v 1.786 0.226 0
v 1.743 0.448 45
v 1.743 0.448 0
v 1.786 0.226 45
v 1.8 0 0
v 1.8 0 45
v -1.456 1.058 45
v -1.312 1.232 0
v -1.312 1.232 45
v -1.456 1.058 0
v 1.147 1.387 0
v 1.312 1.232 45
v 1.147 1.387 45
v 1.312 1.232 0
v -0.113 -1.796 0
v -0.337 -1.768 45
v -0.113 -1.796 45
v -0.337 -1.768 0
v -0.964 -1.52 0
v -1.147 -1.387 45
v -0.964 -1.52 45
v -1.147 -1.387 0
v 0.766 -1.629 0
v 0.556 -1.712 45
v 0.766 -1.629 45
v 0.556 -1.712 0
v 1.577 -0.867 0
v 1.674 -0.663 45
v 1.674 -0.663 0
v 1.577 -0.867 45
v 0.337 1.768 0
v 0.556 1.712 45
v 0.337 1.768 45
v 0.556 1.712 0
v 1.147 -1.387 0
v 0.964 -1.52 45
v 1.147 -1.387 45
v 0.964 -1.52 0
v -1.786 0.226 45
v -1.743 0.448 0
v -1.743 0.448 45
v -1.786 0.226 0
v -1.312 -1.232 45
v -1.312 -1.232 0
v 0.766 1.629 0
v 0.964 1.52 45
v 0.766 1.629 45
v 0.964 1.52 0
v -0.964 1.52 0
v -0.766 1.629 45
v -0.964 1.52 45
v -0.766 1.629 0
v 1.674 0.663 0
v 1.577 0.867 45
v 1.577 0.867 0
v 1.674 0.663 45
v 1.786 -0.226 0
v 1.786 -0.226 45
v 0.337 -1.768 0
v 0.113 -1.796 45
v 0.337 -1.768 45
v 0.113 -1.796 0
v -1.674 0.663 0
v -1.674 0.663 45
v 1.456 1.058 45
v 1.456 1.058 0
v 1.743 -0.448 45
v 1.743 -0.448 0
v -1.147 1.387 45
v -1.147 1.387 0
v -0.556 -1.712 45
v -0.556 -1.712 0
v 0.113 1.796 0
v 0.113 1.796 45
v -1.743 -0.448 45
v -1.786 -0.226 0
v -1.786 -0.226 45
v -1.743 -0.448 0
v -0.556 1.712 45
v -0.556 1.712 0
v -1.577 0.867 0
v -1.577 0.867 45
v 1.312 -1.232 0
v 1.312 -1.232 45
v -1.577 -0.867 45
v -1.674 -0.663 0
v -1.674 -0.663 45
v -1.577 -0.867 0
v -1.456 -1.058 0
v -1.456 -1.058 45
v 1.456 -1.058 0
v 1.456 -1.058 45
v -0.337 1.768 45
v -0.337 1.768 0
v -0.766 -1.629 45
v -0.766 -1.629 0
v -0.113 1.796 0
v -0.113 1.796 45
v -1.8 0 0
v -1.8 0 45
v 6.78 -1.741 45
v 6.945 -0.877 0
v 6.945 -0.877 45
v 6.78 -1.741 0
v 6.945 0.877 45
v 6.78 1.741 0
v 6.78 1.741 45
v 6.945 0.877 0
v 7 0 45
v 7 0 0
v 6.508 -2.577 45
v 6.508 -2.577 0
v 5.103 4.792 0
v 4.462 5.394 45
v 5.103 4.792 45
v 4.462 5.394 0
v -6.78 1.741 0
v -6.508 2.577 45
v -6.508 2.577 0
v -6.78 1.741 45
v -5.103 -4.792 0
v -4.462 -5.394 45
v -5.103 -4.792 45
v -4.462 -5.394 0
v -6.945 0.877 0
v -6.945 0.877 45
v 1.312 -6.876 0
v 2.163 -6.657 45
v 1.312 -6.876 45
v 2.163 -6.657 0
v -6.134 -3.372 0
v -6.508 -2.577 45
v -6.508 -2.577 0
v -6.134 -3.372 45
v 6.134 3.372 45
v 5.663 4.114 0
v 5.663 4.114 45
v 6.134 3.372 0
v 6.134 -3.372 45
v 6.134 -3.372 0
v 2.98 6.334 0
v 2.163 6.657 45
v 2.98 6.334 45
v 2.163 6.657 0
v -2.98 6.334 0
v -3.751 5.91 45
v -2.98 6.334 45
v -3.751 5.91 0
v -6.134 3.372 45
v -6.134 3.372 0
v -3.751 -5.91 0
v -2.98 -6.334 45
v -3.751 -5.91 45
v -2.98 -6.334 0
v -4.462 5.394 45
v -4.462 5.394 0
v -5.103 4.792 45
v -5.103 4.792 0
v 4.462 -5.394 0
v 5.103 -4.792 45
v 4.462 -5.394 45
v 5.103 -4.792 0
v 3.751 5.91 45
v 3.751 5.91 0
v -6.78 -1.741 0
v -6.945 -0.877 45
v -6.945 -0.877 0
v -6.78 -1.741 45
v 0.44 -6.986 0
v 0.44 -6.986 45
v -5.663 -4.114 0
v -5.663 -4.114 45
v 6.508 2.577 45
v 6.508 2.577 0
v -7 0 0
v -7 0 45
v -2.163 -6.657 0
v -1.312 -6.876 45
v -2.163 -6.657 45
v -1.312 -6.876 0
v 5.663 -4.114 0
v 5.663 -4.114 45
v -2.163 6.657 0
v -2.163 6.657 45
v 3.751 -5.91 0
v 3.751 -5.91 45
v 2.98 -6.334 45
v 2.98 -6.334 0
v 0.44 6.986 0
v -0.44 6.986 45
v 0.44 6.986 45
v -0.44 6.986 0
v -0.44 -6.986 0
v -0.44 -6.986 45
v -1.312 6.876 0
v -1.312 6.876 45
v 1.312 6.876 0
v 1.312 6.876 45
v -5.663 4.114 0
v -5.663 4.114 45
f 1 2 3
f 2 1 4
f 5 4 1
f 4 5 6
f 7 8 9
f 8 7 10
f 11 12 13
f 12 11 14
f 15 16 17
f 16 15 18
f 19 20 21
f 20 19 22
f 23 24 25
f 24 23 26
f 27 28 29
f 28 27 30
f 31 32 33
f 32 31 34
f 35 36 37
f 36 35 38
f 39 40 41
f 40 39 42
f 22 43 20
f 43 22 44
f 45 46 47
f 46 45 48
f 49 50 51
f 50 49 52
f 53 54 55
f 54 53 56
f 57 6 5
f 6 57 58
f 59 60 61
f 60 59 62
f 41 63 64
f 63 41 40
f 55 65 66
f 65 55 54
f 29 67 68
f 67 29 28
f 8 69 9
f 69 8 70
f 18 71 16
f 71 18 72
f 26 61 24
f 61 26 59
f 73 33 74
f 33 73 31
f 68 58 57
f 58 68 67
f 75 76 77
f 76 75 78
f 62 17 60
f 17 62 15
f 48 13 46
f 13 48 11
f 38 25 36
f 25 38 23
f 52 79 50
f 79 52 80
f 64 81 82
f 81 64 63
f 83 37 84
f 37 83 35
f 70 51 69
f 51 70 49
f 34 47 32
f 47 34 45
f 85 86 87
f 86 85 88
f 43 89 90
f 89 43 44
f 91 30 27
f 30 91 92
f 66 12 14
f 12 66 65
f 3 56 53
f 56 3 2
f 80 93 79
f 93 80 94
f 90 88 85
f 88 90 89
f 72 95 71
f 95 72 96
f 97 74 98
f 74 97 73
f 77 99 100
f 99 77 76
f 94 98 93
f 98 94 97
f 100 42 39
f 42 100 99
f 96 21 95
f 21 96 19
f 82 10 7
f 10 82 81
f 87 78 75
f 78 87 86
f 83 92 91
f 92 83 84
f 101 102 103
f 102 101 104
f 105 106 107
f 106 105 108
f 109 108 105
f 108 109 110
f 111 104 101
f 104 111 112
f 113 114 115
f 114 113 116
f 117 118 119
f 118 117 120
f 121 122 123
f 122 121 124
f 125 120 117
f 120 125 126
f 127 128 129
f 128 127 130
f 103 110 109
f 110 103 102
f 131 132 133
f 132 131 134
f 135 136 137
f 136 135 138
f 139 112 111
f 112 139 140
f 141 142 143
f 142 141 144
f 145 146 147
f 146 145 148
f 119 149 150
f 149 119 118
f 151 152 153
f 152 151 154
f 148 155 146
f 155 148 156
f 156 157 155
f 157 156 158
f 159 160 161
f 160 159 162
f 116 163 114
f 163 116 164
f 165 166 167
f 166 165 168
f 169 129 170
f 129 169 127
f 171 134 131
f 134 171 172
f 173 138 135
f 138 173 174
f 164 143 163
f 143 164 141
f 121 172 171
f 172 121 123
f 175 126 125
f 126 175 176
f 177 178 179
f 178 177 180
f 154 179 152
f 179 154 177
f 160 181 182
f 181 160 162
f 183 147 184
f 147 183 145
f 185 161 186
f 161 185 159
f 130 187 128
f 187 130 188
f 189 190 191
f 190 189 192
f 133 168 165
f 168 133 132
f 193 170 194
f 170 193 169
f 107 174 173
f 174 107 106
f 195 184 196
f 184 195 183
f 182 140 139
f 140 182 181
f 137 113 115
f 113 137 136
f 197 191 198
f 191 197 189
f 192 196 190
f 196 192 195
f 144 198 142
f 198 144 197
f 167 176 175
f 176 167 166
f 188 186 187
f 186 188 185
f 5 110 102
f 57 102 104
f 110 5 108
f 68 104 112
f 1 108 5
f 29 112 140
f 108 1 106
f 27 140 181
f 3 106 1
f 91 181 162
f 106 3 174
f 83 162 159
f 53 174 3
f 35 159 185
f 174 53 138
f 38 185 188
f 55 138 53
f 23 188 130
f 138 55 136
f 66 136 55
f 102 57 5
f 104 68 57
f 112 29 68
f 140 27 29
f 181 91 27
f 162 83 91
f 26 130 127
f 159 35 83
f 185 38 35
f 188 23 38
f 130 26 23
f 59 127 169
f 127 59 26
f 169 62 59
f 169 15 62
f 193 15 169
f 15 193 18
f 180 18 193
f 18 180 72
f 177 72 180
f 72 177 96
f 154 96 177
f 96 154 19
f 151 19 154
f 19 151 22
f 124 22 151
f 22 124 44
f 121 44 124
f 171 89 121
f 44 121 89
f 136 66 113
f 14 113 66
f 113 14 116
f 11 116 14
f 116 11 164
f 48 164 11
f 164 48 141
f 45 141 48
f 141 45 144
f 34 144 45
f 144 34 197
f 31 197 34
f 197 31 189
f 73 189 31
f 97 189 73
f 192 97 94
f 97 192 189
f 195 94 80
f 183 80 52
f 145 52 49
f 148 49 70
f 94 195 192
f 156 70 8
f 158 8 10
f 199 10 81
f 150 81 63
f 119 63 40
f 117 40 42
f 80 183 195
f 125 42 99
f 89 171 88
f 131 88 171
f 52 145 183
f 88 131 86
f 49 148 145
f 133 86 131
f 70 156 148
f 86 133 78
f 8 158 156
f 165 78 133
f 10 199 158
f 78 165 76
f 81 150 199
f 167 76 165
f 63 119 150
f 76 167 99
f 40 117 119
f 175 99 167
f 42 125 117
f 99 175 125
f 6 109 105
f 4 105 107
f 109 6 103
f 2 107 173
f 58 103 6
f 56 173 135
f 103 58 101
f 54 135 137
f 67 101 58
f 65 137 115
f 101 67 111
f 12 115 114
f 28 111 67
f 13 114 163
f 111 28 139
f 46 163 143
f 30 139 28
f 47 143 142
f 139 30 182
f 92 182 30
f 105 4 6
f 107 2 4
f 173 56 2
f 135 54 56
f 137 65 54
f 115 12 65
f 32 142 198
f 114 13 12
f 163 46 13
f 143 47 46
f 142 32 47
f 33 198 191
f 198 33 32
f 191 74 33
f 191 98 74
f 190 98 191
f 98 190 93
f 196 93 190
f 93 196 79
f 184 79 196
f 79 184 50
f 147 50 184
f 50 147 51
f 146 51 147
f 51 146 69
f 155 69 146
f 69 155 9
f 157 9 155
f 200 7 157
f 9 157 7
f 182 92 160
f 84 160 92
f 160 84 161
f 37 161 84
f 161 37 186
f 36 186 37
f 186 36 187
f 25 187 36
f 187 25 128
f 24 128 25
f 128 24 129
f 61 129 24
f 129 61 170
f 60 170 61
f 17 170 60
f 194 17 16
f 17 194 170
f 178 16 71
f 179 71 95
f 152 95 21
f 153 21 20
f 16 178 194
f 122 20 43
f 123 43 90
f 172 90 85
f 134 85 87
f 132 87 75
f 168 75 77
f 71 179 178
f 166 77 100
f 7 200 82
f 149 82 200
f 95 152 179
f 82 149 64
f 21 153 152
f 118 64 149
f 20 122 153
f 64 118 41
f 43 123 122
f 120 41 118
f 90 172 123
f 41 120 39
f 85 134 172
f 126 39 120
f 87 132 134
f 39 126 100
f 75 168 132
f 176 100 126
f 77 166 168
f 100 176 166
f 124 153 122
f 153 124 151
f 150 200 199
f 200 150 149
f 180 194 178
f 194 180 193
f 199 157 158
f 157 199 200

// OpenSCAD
$fn = 50;


difference() {
	union() {
		cylinder(h = 45, r = 7.0000000000);
	}
	union() {
		translate(v = [0.0000000000, 0.0000000000, -100.0000000000]) {
			cylinder(h = 200, r = 1.8000000000);
		}
		cylinder(h = 45, r = 1.8000000000);
		cylinder(h = 45, r = 1.8000000000);
		cylinder(h = 45, r = 1.8000000000);
	}
}
